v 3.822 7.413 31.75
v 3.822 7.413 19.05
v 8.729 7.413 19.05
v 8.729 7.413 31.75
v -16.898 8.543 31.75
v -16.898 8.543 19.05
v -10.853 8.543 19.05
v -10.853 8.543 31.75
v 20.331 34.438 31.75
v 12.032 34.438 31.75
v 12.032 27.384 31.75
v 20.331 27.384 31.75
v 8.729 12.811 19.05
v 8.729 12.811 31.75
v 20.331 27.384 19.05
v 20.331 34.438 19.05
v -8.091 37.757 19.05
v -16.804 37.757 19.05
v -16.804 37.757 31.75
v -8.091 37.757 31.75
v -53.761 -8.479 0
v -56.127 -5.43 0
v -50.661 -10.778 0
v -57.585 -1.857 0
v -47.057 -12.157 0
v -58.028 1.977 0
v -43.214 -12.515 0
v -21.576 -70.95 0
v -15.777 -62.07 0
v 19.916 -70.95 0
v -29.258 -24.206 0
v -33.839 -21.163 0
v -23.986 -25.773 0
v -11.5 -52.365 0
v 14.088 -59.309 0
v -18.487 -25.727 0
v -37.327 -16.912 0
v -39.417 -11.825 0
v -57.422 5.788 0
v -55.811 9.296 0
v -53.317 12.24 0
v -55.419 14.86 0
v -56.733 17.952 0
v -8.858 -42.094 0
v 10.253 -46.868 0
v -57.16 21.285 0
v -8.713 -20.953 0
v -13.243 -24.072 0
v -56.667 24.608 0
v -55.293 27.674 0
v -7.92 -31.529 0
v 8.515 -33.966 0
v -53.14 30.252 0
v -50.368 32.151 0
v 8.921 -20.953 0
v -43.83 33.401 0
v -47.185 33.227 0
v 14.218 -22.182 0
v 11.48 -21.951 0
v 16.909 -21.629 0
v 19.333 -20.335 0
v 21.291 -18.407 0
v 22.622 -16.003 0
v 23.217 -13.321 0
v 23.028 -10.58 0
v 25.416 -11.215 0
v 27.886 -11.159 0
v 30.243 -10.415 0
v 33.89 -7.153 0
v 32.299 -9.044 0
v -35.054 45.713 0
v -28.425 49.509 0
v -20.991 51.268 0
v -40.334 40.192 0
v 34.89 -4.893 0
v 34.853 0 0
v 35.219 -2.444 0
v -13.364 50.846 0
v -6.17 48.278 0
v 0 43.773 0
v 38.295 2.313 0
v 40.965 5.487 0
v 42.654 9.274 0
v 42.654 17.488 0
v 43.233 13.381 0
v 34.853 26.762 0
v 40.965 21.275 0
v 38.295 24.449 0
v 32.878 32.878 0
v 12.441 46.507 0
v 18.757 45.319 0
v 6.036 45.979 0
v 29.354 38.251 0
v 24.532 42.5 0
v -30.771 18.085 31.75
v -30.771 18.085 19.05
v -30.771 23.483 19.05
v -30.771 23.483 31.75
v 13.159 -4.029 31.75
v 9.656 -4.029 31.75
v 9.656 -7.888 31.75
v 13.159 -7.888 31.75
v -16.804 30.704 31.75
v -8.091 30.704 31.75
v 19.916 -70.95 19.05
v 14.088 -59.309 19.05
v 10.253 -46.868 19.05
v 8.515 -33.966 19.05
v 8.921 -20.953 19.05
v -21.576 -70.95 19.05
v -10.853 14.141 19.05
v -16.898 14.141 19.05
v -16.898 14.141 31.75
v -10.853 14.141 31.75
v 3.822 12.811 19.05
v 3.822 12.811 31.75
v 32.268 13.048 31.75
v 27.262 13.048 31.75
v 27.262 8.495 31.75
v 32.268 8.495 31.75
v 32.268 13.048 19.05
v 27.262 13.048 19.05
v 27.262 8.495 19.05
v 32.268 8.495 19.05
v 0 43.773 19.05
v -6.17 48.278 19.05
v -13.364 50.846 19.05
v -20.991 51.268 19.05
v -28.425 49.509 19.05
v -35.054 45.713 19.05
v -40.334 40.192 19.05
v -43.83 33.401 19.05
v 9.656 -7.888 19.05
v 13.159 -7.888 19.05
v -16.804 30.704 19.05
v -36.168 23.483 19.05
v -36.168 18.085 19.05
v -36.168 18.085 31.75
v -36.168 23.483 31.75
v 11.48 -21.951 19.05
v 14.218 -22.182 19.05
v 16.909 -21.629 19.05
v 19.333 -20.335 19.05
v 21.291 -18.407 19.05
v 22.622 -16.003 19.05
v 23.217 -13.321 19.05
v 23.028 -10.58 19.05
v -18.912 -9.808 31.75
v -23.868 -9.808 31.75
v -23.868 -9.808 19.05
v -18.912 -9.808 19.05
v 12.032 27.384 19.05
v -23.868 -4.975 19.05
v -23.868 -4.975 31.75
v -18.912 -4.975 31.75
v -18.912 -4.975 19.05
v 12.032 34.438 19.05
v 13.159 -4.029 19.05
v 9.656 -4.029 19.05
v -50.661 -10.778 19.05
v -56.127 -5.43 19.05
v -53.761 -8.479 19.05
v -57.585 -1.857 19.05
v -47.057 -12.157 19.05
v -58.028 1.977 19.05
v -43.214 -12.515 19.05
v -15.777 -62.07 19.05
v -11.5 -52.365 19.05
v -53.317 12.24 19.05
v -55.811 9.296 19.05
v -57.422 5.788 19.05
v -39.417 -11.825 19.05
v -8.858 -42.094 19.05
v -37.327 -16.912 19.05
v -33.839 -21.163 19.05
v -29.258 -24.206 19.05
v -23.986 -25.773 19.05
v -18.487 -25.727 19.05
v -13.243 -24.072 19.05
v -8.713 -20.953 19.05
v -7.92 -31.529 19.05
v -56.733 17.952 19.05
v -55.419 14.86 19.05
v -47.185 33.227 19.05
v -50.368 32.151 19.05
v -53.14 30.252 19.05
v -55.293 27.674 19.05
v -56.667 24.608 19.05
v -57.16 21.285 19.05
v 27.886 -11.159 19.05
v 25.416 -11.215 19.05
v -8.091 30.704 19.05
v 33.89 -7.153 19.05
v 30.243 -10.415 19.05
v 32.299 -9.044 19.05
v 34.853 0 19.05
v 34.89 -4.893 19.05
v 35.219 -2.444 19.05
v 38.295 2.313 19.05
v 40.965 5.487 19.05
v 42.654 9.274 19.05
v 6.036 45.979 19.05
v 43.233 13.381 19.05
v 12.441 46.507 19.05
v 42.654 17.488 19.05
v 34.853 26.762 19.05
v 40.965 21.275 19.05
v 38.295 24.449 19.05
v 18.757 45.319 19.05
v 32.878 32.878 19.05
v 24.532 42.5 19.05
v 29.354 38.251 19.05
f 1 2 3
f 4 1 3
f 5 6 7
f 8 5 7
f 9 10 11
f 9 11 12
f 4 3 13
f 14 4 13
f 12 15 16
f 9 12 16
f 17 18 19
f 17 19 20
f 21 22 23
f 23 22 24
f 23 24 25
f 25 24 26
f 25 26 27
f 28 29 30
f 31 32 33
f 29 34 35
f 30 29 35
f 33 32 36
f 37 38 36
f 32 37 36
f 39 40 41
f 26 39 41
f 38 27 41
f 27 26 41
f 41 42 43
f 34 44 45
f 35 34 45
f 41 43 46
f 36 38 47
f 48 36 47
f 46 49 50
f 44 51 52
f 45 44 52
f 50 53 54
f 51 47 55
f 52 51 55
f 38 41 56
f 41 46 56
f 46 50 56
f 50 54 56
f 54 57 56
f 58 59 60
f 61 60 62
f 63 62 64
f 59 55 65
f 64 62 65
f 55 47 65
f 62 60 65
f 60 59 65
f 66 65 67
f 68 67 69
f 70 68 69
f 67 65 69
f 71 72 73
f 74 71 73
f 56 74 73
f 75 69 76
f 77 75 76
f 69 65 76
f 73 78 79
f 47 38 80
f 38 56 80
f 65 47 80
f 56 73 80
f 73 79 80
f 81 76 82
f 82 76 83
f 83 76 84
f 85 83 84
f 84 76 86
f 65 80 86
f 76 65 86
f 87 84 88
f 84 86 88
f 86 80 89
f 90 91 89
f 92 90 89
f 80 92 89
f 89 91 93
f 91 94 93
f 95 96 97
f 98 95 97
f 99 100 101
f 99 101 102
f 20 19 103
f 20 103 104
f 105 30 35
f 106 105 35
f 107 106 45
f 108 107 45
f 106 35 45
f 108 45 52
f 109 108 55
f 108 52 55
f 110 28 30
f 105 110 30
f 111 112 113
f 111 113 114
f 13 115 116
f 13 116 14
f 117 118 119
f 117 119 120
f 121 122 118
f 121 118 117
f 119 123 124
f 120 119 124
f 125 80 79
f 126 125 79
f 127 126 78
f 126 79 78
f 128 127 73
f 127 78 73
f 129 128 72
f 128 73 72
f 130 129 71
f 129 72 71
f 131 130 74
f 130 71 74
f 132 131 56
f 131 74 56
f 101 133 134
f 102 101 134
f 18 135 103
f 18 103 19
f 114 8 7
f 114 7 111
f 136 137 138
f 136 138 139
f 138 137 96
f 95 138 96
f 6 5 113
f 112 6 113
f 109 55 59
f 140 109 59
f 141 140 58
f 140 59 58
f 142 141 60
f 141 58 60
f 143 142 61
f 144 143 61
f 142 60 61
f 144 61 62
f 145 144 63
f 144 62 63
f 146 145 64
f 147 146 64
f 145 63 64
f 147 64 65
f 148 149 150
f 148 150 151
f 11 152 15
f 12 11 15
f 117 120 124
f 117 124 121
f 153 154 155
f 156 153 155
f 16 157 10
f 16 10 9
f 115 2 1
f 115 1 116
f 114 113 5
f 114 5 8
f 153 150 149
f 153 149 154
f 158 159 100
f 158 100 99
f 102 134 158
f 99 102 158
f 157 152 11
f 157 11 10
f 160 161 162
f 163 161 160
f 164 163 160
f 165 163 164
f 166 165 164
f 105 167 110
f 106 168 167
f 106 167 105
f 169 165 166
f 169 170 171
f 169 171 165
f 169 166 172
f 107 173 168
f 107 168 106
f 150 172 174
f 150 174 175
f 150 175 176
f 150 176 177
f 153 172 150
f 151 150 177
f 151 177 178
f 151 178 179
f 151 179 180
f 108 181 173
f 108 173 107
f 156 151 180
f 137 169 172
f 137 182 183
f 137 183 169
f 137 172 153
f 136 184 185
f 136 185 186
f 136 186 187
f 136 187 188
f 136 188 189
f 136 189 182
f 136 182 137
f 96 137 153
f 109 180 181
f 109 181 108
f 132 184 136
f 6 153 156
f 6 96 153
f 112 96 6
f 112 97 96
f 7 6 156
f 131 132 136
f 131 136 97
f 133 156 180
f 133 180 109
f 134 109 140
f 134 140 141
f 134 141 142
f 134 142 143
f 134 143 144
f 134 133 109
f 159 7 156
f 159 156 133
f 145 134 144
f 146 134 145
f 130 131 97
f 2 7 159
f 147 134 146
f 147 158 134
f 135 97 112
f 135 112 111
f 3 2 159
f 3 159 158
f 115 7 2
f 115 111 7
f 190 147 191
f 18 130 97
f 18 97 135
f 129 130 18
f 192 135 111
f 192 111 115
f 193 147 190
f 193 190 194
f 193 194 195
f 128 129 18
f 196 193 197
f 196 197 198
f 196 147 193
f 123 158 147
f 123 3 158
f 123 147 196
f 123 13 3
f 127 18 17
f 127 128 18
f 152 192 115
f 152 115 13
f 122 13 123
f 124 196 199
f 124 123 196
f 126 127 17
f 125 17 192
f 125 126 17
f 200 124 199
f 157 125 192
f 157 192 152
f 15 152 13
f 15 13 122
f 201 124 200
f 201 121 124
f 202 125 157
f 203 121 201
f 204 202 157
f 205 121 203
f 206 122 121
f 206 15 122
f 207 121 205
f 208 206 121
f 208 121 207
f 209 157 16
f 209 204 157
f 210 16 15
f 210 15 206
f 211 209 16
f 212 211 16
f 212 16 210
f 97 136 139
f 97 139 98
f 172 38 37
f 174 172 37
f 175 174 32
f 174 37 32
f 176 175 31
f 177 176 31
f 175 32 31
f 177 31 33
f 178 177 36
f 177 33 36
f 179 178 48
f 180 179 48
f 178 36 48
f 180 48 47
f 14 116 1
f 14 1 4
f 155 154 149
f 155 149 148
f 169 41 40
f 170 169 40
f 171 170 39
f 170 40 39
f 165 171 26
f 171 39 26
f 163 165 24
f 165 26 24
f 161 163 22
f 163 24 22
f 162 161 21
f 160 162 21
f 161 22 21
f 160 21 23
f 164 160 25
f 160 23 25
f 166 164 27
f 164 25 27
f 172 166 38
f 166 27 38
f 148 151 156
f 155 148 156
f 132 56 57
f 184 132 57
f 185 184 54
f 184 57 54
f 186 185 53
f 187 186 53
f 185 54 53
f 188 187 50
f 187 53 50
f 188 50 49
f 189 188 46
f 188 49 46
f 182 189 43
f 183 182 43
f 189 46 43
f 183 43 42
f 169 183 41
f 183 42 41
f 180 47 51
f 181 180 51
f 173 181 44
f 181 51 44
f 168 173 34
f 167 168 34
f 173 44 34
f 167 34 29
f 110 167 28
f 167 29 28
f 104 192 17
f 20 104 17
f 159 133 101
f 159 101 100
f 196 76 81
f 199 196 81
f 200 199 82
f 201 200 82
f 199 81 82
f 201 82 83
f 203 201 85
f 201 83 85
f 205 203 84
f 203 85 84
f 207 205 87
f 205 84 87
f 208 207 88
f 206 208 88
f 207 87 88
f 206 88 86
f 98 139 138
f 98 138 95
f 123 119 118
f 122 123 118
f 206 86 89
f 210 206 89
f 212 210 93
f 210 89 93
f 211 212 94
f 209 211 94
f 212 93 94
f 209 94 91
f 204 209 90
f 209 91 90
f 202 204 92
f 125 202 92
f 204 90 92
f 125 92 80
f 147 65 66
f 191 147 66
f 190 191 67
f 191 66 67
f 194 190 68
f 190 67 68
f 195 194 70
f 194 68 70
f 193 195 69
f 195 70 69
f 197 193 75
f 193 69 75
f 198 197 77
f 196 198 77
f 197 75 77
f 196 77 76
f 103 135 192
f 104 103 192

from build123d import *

# Parameters (mm, degrees)
F1_DEPTH = 19.05
F2_W     = 4.956221
F2_H     = 4.832608
F2_W_2   = 6.044237
F2_H_2   = 5.597412
F2_W_3   = 4.906744
F2_H_3   = 5.397417
F2_W_4   = 8.298278
F2_H_4   = 7.053539
F2_W_5   = 8.713215
F2_W_6   = 5.397439
F2_H_5   = 5.397424
F2_W_7   = 3.502958
F2_H_6   = 3.859587
F2_W_8   = 5.006534
F2_H_7   = 4.553236
F3_DEPTH = 12.7


with BuildPart() as f1:
    # F0 (on Top) → F1 (new body)
    with BuildSketch(Plane.XY):
        with BuildLine():
            ThreePointArc((-8.71323, -20.953164), (-9.969081, -47.283156), (-21.57557, -70.950329))
            Line((-21.57557, -70.950329), (19.915849, -70.950329))
            ThreePointArc((19.915849, -70.950329), (10.252818, -46.867793), (8.920625, -20.953164))
            ThreePointArc((8.920625, -20.953164), (19.332917, -20.334627), (23.027718, -10.580301))
            ThreePointArc((23.027718, -10.580301), (32.298513, -9.043512), (34.852773, 0))
            ThreePointArc((34.852773, 0), (43.232597, 13.380993), (34.852773, 26.761986))
            ThreePointArc((34.852773, 26.761986), (21.73884, 44.102992), (0, 43.773465))
            ThreePointArc((0, 43.773465), (-24.771472, 50.65636), (-43.830308, 33.40061))
            ThreePointArc((-43.830308, 33.40061), (-56.08557, 26.187958), (-53.316519, 12.239978))
            ThreePointArc((-53.316519, 12.239978), (-56.12724, -5.430092), (-39.416879, -11.82504))
            ThreePointArc((-39.416879, -11.82504), (-26.680312, -25.185865), (-8.71323, -20.953164))
        make_face()
    extrude(amount=F1_DEPTH)

    # F2 (on face) → F3 (join)
    with BuildSketch(Plane.XY.offset(19.05)):
        with Locations((-21.390158, -7.391732)):
            Rectangle(F2_W, F2_H)
        with Locations((-13.875554, 11.341883)):
            Rectangle(F2_W_2, F2_H_2)
        with Locations((6.275192, 10.112039)):
            Rectangle(F2_W_3, F2_H_3)
        with Locations((16.181633, 30.911125)):
            Rectangle(F2_W_4, F2_H_4)
        with Locations((-12.447461, 34.230441)):
            Rectangle(F2_W_5, F2_H_4)
        with Locations((-33.469454, 20.78421)):
            Rectangle(F2_W_6, F2_H_5)
        with Locations((11.407079, -5.958605)):
            Rectangle(F2_W_7, F2_H_6)
        with Locations((29.765008, 10.771705)):
            Rectangle(F2_W_8, F2_H_7)
    extrude(amount=F3_DEPTH)


solid = f1.part
